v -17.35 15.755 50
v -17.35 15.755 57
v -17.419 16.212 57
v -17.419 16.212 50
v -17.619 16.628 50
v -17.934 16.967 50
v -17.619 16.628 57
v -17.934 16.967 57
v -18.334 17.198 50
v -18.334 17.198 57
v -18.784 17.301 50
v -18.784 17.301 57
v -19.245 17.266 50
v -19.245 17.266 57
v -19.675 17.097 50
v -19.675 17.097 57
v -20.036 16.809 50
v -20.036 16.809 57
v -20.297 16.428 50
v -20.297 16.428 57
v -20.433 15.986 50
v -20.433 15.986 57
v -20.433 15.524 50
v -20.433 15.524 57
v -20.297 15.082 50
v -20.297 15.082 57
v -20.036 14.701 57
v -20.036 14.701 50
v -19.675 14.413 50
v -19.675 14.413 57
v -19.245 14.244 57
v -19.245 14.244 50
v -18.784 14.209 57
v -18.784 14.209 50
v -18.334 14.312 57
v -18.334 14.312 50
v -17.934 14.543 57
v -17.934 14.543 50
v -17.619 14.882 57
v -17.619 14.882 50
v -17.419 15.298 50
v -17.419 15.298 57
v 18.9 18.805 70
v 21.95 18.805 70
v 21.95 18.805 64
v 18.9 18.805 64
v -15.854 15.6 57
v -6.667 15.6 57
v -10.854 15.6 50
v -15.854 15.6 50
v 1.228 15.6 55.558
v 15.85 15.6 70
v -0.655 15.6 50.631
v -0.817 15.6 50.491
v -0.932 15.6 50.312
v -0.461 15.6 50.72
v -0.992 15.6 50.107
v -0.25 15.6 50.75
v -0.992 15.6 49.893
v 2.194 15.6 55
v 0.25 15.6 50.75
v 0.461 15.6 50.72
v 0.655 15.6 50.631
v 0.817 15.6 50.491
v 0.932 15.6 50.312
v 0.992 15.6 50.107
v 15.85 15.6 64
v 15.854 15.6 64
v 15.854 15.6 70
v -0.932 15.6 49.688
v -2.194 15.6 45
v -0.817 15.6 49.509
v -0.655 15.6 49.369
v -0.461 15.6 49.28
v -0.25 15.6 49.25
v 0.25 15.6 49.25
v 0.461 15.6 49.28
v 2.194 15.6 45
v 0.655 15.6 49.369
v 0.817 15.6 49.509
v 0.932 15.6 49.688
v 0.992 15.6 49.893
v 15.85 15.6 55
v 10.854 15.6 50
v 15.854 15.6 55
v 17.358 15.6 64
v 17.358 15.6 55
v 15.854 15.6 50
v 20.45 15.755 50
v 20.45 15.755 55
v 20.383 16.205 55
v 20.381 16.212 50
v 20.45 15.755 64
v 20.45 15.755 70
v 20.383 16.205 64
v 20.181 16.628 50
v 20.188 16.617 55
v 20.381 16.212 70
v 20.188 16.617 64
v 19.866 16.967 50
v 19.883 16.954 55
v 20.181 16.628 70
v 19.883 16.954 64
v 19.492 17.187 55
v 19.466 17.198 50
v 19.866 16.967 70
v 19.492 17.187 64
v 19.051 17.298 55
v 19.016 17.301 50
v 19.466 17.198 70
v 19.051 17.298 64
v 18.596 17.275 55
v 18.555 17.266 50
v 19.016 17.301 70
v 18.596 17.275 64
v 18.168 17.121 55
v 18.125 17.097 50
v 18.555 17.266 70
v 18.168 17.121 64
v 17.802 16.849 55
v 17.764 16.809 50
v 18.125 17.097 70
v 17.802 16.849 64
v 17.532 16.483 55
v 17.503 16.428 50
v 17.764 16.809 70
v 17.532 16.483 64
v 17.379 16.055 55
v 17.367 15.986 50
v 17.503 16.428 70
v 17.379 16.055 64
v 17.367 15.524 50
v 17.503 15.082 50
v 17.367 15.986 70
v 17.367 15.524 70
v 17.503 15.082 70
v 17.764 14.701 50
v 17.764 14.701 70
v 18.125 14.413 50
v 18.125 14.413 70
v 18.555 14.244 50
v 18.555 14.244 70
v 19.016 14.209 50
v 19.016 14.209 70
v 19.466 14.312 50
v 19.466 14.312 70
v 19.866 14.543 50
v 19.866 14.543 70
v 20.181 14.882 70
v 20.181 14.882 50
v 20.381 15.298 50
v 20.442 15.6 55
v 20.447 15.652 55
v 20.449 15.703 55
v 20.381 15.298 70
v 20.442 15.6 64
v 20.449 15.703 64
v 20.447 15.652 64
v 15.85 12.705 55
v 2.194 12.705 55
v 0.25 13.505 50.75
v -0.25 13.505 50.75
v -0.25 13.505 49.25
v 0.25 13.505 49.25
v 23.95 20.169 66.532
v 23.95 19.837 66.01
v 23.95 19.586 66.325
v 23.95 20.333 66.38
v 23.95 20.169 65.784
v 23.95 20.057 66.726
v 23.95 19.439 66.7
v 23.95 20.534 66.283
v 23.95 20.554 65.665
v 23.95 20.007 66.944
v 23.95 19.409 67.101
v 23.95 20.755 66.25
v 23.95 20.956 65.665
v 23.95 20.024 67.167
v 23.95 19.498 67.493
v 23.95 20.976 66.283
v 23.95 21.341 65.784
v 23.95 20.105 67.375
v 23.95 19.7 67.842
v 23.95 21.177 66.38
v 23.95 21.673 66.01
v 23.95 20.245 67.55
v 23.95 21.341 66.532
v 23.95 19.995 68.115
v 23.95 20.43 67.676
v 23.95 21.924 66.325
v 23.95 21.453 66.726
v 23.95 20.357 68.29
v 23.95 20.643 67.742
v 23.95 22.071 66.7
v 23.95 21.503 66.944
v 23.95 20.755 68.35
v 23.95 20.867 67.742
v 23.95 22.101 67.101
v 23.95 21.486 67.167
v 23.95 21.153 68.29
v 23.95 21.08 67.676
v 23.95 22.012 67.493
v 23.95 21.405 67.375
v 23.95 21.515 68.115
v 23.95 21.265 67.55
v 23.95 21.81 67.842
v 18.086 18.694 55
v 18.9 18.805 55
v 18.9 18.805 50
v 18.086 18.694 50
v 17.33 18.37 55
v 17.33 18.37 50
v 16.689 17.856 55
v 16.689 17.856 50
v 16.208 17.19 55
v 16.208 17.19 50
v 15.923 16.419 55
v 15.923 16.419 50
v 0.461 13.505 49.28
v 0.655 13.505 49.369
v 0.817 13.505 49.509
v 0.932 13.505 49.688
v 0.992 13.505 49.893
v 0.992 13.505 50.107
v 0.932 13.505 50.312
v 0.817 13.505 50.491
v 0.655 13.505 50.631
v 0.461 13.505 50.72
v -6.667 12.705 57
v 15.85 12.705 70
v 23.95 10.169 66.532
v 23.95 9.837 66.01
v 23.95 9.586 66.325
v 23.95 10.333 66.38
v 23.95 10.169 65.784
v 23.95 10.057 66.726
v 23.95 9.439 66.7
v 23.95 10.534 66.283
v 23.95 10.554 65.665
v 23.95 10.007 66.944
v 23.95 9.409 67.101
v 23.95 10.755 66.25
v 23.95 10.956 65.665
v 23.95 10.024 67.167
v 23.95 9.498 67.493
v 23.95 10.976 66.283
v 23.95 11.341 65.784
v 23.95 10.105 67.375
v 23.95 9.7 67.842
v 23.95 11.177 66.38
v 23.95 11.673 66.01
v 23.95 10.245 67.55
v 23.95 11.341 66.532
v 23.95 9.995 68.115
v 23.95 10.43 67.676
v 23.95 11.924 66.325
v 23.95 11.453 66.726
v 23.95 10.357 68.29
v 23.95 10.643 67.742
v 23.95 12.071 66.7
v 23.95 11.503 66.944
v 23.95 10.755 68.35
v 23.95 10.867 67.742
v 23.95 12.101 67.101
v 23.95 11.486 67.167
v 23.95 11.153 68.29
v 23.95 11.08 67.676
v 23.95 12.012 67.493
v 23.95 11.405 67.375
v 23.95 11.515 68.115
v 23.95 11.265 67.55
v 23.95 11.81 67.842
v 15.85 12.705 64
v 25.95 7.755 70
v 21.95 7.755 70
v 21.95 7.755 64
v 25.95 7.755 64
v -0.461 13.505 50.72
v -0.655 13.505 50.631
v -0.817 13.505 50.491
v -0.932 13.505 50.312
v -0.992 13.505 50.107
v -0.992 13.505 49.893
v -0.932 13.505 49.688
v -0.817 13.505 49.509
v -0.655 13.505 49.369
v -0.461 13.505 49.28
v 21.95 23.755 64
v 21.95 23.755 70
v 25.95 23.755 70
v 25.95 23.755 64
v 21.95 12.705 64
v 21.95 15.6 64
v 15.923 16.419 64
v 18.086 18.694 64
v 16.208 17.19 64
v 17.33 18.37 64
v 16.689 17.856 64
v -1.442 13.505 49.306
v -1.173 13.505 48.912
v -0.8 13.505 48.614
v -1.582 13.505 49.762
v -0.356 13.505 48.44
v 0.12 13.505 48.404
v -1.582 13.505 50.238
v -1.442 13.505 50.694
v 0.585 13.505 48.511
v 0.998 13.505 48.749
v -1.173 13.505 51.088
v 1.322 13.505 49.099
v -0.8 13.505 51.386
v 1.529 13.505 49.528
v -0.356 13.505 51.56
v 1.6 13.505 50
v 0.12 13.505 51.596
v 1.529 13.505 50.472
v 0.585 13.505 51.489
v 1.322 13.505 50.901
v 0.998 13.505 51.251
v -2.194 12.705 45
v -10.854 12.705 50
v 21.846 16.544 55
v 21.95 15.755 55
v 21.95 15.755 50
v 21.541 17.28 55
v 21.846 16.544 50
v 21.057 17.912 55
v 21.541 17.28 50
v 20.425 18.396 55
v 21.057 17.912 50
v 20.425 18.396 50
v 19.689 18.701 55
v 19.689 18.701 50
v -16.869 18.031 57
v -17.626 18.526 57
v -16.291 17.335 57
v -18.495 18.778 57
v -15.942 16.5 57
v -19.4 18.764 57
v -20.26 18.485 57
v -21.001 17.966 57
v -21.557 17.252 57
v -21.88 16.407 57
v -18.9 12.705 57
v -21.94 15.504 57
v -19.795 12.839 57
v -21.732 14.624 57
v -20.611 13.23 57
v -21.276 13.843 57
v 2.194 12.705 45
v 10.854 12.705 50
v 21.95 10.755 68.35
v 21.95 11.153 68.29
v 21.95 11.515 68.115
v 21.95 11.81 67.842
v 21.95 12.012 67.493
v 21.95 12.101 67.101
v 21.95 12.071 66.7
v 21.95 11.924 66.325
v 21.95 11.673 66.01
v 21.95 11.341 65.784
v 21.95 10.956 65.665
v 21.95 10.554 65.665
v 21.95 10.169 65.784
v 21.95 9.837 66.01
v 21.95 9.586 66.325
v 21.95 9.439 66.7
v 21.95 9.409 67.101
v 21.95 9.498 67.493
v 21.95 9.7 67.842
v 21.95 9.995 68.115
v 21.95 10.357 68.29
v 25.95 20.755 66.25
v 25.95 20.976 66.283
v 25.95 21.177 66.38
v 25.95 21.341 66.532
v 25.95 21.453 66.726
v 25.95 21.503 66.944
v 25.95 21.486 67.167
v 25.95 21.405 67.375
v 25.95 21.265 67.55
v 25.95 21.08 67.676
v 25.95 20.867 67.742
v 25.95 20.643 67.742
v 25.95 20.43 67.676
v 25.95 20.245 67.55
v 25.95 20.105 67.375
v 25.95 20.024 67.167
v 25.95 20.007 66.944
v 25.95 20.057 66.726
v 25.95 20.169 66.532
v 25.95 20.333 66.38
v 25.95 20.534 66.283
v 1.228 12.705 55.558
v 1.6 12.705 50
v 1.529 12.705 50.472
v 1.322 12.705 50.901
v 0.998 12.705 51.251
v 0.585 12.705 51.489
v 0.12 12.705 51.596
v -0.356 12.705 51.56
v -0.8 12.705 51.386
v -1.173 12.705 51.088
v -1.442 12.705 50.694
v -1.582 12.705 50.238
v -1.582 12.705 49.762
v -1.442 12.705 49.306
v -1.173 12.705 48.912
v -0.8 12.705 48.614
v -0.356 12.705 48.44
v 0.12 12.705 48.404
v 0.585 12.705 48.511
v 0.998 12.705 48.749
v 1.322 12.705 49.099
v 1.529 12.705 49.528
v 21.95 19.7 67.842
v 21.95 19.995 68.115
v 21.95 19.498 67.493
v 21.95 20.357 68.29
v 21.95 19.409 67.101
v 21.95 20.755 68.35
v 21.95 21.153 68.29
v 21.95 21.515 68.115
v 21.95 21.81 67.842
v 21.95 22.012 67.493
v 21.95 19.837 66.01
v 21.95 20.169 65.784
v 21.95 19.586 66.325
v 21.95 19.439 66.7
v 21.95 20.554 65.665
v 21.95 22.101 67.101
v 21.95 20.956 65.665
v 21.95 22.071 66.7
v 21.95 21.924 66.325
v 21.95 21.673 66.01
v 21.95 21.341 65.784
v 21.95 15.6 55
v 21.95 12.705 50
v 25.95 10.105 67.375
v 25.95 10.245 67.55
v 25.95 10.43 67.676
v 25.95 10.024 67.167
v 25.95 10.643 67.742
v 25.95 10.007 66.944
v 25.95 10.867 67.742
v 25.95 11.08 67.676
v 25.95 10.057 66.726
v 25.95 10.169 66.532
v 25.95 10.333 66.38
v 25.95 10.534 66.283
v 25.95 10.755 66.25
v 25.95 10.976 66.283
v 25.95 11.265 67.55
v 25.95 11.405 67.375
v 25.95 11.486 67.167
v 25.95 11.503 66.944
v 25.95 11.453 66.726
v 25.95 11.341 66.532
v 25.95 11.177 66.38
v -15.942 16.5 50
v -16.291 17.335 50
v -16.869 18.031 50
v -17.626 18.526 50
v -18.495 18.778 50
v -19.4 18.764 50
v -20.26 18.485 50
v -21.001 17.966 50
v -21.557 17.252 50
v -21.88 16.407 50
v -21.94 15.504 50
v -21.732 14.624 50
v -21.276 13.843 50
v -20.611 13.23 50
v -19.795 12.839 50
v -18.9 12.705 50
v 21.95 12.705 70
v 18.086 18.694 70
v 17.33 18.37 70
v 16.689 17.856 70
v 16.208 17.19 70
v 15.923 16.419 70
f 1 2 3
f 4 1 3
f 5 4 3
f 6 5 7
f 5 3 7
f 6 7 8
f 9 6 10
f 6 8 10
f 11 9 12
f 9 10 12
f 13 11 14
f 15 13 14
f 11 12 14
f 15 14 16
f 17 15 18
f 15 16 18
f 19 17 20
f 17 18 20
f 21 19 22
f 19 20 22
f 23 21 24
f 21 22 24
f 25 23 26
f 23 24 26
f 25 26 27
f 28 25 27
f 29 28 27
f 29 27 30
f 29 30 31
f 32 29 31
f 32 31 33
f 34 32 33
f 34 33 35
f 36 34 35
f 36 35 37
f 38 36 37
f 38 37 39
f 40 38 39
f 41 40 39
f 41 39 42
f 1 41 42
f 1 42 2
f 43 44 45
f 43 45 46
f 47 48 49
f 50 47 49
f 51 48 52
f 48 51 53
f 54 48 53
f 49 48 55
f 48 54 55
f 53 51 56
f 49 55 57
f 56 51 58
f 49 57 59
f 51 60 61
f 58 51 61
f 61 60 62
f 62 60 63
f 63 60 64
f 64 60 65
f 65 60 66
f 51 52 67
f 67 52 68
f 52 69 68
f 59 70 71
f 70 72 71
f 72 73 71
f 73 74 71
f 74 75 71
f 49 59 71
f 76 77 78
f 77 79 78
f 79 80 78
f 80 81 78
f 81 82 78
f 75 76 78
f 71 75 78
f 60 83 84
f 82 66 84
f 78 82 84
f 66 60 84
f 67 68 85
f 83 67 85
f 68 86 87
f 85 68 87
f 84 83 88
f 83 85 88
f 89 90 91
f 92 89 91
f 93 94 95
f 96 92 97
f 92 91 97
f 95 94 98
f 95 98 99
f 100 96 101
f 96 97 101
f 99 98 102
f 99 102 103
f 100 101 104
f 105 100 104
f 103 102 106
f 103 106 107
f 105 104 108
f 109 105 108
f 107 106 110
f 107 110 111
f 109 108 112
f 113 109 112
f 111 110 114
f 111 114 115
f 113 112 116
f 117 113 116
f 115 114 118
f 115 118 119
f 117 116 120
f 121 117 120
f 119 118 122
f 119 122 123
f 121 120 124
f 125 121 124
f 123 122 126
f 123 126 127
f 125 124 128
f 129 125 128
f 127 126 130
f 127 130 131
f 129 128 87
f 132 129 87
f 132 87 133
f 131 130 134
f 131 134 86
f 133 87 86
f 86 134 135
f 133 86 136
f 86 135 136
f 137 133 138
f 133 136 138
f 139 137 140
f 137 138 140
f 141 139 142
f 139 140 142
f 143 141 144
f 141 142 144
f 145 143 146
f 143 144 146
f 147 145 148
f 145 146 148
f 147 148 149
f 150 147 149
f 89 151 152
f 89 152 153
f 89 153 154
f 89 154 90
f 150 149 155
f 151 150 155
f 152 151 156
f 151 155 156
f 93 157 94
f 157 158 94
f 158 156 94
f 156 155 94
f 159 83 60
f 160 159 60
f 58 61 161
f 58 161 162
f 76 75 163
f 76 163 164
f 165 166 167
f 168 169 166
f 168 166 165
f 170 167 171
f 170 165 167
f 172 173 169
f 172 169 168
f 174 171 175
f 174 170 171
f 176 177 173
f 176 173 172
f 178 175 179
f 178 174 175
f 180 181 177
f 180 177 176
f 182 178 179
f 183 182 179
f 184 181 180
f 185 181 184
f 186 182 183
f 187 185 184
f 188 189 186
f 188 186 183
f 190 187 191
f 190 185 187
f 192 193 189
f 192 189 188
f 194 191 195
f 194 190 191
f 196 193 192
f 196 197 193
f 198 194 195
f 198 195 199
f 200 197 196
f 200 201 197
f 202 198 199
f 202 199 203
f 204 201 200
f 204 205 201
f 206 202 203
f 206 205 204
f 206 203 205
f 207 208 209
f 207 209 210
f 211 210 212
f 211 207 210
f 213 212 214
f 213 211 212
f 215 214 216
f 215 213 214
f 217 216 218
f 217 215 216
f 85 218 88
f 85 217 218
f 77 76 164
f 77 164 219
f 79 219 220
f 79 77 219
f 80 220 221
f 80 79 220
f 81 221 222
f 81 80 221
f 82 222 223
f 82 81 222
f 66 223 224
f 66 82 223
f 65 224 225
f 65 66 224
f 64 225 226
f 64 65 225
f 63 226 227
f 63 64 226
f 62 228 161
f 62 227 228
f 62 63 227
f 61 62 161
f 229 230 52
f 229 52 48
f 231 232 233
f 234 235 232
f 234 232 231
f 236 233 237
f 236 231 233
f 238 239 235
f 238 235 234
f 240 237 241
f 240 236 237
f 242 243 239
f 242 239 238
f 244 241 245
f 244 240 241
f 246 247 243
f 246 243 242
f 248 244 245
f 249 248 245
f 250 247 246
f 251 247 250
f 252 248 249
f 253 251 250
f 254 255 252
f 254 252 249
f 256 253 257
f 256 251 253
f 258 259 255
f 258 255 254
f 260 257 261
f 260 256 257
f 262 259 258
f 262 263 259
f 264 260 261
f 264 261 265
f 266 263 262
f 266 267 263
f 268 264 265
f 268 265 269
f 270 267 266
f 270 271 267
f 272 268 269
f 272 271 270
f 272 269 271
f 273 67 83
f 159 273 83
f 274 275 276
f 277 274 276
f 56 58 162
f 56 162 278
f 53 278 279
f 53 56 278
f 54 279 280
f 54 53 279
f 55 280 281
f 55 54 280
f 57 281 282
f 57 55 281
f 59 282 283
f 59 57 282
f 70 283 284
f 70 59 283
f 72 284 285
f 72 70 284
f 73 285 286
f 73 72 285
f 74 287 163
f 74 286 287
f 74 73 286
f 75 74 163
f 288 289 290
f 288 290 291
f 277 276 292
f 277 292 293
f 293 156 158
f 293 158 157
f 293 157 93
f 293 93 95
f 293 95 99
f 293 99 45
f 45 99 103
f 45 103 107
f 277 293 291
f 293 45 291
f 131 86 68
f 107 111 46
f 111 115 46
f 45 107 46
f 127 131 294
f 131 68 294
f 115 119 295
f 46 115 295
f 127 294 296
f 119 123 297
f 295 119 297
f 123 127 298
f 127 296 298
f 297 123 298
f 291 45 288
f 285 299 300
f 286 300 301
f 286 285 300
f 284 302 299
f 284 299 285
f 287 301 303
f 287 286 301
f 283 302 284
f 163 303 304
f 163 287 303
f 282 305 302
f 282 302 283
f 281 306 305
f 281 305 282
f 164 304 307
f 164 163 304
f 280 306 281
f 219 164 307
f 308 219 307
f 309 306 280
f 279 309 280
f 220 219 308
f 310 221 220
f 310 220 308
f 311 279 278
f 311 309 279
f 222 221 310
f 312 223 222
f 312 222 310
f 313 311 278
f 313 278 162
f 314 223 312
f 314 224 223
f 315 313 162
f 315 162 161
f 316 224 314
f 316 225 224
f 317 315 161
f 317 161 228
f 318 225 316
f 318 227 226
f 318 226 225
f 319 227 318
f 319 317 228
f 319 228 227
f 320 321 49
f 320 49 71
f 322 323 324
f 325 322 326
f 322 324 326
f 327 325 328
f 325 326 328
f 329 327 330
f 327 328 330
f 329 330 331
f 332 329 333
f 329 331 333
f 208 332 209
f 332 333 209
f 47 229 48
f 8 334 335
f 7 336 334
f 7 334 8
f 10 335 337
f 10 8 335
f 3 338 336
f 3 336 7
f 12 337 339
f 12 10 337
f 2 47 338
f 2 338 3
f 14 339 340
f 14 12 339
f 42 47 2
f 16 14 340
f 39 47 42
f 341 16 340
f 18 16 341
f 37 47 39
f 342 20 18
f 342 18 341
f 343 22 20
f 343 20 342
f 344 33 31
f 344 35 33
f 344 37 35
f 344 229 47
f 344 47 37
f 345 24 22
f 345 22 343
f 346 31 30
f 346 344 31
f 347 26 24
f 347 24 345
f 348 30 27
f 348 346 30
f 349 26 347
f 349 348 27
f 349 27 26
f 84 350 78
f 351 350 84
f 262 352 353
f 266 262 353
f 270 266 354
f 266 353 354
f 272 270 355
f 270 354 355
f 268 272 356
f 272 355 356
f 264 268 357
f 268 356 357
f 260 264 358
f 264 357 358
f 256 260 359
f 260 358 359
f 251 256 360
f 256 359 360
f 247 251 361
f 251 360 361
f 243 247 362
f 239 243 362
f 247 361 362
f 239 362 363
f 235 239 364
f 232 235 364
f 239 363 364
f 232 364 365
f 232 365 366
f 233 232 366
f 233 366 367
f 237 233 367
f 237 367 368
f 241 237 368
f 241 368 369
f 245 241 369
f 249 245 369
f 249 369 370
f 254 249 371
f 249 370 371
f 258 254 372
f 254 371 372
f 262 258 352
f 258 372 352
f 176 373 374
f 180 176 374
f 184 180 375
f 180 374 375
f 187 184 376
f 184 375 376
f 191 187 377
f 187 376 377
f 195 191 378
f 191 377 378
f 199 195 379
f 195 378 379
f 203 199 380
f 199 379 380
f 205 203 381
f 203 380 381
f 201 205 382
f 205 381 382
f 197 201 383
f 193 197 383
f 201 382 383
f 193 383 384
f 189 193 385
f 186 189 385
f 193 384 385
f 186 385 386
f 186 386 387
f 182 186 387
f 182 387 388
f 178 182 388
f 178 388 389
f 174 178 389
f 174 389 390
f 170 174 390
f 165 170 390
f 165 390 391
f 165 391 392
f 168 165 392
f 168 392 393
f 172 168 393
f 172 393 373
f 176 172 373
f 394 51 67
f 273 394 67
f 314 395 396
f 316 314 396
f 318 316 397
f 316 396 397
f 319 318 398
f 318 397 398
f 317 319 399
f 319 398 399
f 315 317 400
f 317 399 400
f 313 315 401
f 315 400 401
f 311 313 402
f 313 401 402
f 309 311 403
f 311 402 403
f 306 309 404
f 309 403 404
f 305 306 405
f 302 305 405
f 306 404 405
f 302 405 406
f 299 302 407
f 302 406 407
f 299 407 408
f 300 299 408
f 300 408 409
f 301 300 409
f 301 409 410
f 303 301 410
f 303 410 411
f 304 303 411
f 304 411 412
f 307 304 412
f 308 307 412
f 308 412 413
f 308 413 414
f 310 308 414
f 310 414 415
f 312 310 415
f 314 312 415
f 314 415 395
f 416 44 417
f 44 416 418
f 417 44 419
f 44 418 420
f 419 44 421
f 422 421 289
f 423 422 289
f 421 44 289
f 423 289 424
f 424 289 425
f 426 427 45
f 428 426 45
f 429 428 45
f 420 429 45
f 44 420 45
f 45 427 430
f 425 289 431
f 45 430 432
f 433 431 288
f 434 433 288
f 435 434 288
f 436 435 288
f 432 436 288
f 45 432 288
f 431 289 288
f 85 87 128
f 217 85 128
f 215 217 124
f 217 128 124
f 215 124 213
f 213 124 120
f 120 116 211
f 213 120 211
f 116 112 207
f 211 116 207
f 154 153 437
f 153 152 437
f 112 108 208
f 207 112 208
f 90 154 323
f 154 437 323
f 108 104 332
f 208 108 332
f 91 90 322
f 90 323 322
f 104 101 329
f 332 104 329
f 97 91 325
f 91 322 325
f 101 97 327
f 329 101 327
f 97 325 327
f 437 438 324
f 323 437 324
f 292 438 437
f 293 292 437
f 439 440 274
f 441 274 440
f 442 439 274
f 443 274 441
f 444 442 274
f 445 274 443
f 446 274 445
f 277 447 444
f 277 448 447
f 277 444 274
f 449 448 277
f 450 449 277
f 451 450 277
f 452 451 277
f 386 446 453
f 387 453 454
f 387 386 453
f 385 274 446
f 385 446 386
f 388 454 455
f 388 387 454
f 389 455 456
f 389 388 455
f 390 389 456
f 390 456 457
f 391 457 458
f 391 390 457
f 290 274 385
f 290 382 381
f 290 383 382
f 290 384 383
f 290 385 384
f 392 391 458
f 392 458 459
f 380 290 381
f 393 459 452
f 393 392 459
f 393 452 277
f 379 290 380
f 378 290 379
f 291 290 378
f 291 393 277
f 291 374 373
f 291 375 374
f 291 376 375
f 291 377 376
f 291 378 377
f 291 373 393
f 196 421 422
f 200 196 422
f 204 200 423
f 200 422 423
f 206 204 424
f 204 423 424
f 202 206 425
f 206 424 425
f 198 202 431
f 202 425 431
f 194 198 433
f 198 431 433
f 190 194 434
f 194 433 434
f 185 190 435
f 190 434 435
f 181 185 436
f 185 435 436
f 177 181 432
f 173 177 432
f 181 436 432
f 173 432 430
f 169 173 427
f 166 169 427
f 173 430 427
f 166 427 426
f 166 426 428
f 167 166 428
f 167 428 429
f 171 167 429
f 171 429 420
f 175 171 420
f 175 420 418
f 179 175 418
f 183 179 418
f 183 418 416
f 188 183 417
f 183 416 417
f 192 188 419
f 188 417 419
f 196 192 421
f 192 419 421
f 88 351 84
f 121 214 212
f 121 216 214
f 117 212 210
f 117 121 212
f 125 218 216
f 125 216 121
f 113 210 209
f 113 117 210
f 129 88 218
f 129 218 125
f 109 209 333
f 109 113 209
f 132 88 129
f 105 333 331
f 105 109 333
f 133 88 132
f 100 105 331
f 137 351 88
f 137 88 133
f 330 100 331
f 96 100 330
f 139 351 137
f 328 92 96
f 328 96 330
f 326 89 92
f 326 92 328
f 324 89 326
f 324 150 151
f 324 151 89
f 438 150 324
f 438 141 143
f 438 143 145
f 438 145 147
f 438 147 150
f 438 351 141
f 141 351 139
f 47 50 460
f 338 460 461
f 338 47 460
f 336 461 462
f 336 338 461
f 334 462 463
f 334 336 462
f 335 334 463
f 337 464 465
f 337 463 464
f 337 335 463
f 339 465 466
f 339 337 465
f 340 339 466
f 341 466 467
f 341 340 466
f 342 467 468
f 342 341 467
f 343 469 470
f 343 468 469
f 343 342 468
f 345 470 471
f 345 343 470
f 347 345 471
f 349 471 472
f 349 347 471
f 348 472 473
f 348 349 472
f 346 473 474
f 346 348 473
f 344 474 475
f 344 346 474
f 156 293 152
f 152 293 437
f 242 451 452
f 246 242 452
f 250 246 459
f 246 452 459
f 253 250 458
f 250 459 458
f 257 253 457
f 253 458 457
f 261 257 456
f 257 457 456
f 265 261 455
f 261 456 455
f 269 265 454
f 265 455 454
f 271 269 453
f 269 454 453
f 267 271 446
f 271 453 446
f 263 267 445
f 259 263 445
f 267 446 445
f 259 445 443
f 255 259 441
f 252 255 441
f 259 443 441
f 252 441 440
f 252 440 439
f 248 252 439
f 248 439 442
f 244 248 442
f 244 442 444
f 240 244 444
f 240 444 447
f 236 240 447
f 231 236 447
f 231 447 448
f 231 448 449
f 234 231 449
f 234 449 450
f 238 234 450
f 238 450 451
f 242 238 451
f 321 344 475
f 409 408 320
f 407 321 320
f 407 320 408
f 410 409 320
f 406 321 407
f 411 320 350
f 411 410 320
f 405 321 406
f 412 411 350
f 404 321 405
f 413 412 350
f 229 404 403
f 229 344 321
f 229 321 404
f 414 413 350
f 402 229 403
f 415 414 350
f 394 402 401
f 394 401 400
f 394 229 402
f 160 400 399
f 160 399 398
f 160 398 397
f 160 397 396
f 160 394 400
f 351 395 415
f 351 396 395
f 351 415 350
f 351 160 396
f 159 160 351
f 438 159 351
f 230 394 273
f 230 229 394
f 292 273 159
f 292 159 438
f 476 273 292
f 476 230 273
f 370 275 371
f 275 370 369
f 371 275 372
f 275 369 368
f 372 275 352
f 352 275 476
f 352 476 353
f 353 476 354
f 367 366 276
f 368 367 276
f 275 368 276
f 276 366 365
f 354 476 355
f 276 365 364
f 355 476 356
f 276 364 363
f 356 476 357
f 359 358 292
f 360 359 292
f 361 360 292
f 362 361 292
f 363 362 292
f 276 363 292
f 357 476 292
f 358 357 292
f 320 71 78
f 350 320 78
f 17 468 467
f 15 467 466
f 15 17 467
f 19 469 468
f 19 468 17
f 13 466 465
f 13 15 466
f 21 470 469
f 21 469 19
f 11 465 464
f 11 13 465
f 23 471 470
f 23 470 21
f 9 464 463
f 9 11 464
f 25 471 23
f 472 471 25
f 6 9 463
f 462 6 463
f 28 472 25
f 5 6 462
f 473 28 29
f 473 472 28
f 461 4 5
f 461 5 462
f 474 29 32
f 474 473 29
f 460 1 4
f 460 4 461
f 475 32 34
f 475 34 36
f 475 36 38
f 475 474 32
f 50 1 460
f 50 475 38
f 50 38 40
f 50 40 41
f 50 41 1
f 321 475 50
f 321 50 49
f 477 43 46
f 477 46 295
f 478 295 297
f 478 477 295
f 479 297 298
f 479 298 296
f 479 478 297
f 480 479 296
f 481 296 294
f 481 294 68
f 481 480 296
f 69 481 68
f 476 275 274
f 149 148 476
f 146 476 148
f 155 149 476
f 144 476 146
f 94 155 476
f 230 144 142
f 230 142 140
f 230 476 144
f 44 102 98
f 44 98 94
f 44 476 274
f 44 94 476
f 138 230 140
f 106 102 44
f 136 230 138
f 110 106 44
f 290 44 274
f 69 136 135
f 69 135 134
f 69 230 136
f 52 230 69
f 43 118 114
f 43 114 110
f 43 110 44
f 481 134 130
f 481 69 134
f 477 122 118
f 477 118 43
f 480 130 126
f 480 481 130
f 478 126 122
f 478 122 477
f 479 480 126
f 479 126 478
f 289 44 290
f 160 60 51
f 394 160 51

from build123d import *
from build123d.topology import SkipClean

# Parameters (mm, degrees)
SKETCH_2_R           = 3.05
SKETCH_2_R_2         = 1.55
EXTRUDE_1_DEPTH      = 25
CUT_EXTRUDE_3_DEPTH  = 74.430746455
SKETCH_8_R           = 1.6
CUT_EXTRUDE_4_DEPTH  = 0.8
CUT_EXTRUDE_START    = -2.895
CUT_EXTRUDE_10_DEPTH = 6.1
SKETCH_21_W          = 6
SKETCH_21_H          = 16
EXTRUDE_9_DEPTH      = 4
SKETCH_22_R          = 0.75
CUT_EXTRUDE_16_DEPTH = 4
CUT_EXTRUDE_19_DEPTH = 76.099311082
CUT_EXTRUDE_21_REACH = 87.974
SKETCH_25_W          = 9
SKETCH_25_H          = 3.205
CUT_EXTRUDE_22_REACH = 42.469
SKETCH_27_R          = 1.35
CUT_EXTRUDE_23_DEPTH = 2


# Read off the part's stored shape, not the designer's step: 切除-拉伸10
with BuildPart() as part:
    # 草图2 → 凸台-拉伸1 (new body)
    # profile 1 of 8: a face of its own
    with SkipClean():  # the faces are left unmerged after this step: merging them gives an invalid solid
        with BuildSketch(Plane.XY.offset(70)):
            with Locations((-18.9, 15.755)):
                Circle(SKETCH_2_R)
            with Locations((-18.9, 15.755)):
                Circle(SKETCH_2_R_2, mode=Mode.SUBTRACT)
        # profile 2 of 8: a face of its own
        with BuildSketch(Plane.XY.offset(70)):
            with BuildLine():
                Line((0, 12.705), (0, 15.6))
                Line((0, 15.6), (-15.853941071, 15.6))
                ThreePointArc((-15.853941071, 15.6), (-16.798839606, 13.544202633), (-18.9, 12.705))
                Line((-18.9, 12.705), (0, 12.705))
            make_face()
        # profile 3 of 8: a face of its own
        with BuildSketch(Plane.XY.offset(70)):
            with BuildLine():
                Line((15.853941071, 15.6), (0, 15.6))
                Line((0, 15.6), (0, 12.705))
                Line((0, 12.705), (18.9, 12.705))
                ThreePointArc((18.9, 12.705), (16.798839606, 13.544202633), (15.853941071, 15.6))
            make_face()
        # profile 4 of 8: a face of its own
        with BuildSketch(Plane.XY.offset(70)):
            with Locations((18.9, 15.755)):
                Circle(SKETCH_2_R)
            with Locations((18.9, 15.755)):
                Circle(SKETCH_2_R_2, mode=Mode.SUBTRACT)
        # profile 5 of 8: a face of its own
        with BuildSketch(Plane.XY.offset(70)):
            with BuildLine():
                Line((21.95, 18.805), (18.9, 18.805))
                ThreePointArc((18.9, 18.805), (21.056675683, 17.911675683), (21.95, 15.755))
                Line((21.95, 15.755), (21.95, 18.805))
            make_face()
        # profile 6 of 8: a face of its own
        with BuildSketch(Plane.XY.offset(70)):
            with BuildLine():
                ThreePointArc((18.9, 18.805), (16.689202633, 17.856160394), (15.853941071, 15.6))
                ThreePointArc((15.853941071, 15.6), (16.798839606, 13.544202633), (18.9, 12.705))
                Line((18.9, 12.705), (18.9, 14.205))
                ThreePointArc((18.9, 14.205), (17.35, 15.755), (18.9, 17.305))
                Line((18.9, 17.305), (18.9, 18.805))
            make_face()
        # profile 7 of 8: a face of its own
        with BuildSketch(Plane.XY.offset(70)):
            with BuildLine():
                Line((18.9, 14.205), (18.9, 12.705))
                ThreePointArc((18.9, 12.705), (21.056675683, 13.598324317), (21.95, 15.755))
                ThreePointArc((21.95, 15.755), (21.056675683, 17.911675683), (18.9, 18.805))
                Line((18.9, 18.805), (18.9, 17.305))
                ThreePointArc((18.9, 17.305), (19.996015511, 16.851015511), (20.45, 15.755))
                ThreePointArc((20.45, 15.755), (19.996015511, 14.658984489), (18.9, 14.205))
            make_face()
        # profile 8 of 8: a face of its own
        with BuildSketch(Plane.XY.offset(70)):
            with BuildLine():
                ThreePointArc((21.95, 15.755), (21.056675683, 13.598324317), (18.9, 12.705))
                Line((18.9, 12.705), (21.95, 12.705))
                Line((21.95, 12.705), (21.95, 15.755))
            make_face()
        extrude(amount=-EXTRUDE_1_DEPTH)

    # 草图7 → 切除-拉伸3 (cut, through all)
    with SkipClean():  # the faces are left unmerged after this step: merging them gives an invalid solid
        with BuildSketch(Plane(origin=(0, 15.6, 0), x_dir=(1, 0, 0), z_dir=(0, 1, 0))):
            with BuildLine():
                Line((0.25, -50.75), (-0.25, -50.75))
                ThreePointArc((-0.25, -50.75), (-1, -50), (-0.25, -49.25))
                Line((-0.25, -49.25), (0.25, -49.25))
                ThreePointArc((0.25, -49.25), (1, -50), (0.25, -50.75))
            make_face()
        extrude(amount=-CUT_EXTRUDE_3_DEPTH, mode=Mode.SUBTRACT)

    # 草图8 → 切除-拉伸4 (cut)
    with SkipClean():  # the faces are left unmerged after this step: merging them gives an invalid solid
        with BuildSketch(Plane.XZ.offset(-12.705)):
            with Locations((0, 50)):
                Circle(SKETCH_8_R)
        extrude(amount=-CUT_EXTRUDE_4_DEPTH, mode=Mode.SUBTRACT)

    # 切除-拉伸10 outline → 切除-拉伸10 (cut)
    with SkipClean():  # the faces are left unmerged after this step: merging them gives an invalid solid
        with BuildSketch(Plane(origin=(0, 15.6, 0), x_dir=(1, 0, 0), z_dir=(0, 1, 0)).offset(CUT_EXTRUDE_START)):
            Polygon((-6.666660498, -57), (-21.95, -57), (-21.95, -70), (15.85, -70), align=None)
            Polygon((-21.95, -50), (-10.853941071, -50), (-2.193687033, -45), (-21.95, -45), align=None)
            Polygon((10.853941071, -50), (21.95, -50), (21.95, -45), (2.193687033, -45), align=None)
        extrude(amount=CUT_EXTRUDE_10_DEPTH, mode=Mode.SUBTRACT)

    # 草图21 → 凸台-拉伸9 (add)
    with SkipClean():  # the faces are left unmerged after this step: merging them gives an invalid solid
        with BuildSketch(Plane(origin=(21.95, 0, 0), x_dir=(0, 0, -1), z_dir=(1, 0, 0))):
            with Locations((-67, 15.755)):
                Rectangle(SKETCH_21_W, SKETCH_21_H)
        extrude(amount=EXTRUDE_9_DEPTH)

    # 草图22 → 切除-拉伸16 (cut)
    with SkipClean():  # the faces are left unmerged after this step: merging them gives an invalid solid
        with BuildSketch(Plane(origin=(25.95, 0, 0), x_dir=(0, 0, -1), z_dir=(1, 0, 0))):
            with Locations((-67, 20.755)):
                Circle(SKETCH_22_R)
            with Locations((-67, 10.755)):
                Circle(SKETCH_22_R)
        extrude(amount=-CUT_EXTRUDE_16_DEPTH, mode=Mode.SUBTRACT)

    # 草图23 → 切除-拉伸19 (cut, through all)
    with SkipClean():  # the faces are left unmerged after this step: merging them gives an invalid solid
        with BuildSketch(Plane(origin=(0, 15.6, 0), x_dir=(1, 0, 0), z_dir=(0, 1, 0))):
            Polygon((1.227614882, -55.557762016), (15.85, -64), (15.85, -55), (2.193687033, -55), align=None)
        extrude(amount=-CUT_EXTRUDE_19_DEPTH, mode=Mode.SUBTRACT)

    # 草图25 → 切除-拉伸21 (cut, up to next)
    with BuildSketch(Plane(origin=(21.95, 0, 0), x_dir=(0, 0, -1), z_dir=(1, 0, 0)), mode=Mode.PRIVATE) as cut_extrude_21_sk1:
        with Locations((-59.5, 17.2025)):
            Rectangle(SKETCH_25_W, SKETCH_25_H)
    cut_extrude_21_tool1 = extrude(cut_extrude_21_sk1.sketch, amount=-CUT_EXTRUDE_21_REACH, mode=Mode.PRIVATE) & part.part
    add(cut_extrude_21_tool1.solids().sort_by_distance((21.95, 17.2025, 59.5))[0], mode=Mode.SUBTRACT)

    # 草图26 → 切除-拉伸22 (cut, up to next)
    with BuildSketch(Plane(origin=(0, 0, 50), x_dir=(-1, 0, 0), z_dir=(0, 0, -1)), mode=Mode.PRIVATE) as cut_extrude_22_sk1:
        with BuildLine():
            ThreePointArc((-21.95, 15.755), (-21.056675683, 17.911675683), (-18.9, 18.805))
            Line((-18.9, 18.805), (-21.95, 18.805))
            Line((-21.95, 18.805), (-21.95, 15.755))
        make_face()
    cut_extrude_22_tool1 = extrude(cut_extrude_22_sk1.sketch, amount=-CUT_EXTRUDE_22_REACH, mode=Mode.PRIVATE) & part.part
    add(cut_extrude_22_tool1.solids().sort_by_distance((21.268728, 18.123728, 50))[0], mode=Mode.SUBTRACT)

    # 草图27 → 切除-拉伸23 (cut)
    with SkipClean():  # the faces are left unmerged after this step: merging them gives an invalid solid
        with BuildSketch(Plane.ZY.offset(-21.95)):
            with Locations((67, 20.755)):
                Circle(SKETCH_27_R)
            with Locations((67, 10.755)):
                Circle(SKETCH_27_R)
        extrude(amount=-CUT_EXTRUDE_23_DEPTH, mode=Mode.SUBTRACT)


solid = part.part
